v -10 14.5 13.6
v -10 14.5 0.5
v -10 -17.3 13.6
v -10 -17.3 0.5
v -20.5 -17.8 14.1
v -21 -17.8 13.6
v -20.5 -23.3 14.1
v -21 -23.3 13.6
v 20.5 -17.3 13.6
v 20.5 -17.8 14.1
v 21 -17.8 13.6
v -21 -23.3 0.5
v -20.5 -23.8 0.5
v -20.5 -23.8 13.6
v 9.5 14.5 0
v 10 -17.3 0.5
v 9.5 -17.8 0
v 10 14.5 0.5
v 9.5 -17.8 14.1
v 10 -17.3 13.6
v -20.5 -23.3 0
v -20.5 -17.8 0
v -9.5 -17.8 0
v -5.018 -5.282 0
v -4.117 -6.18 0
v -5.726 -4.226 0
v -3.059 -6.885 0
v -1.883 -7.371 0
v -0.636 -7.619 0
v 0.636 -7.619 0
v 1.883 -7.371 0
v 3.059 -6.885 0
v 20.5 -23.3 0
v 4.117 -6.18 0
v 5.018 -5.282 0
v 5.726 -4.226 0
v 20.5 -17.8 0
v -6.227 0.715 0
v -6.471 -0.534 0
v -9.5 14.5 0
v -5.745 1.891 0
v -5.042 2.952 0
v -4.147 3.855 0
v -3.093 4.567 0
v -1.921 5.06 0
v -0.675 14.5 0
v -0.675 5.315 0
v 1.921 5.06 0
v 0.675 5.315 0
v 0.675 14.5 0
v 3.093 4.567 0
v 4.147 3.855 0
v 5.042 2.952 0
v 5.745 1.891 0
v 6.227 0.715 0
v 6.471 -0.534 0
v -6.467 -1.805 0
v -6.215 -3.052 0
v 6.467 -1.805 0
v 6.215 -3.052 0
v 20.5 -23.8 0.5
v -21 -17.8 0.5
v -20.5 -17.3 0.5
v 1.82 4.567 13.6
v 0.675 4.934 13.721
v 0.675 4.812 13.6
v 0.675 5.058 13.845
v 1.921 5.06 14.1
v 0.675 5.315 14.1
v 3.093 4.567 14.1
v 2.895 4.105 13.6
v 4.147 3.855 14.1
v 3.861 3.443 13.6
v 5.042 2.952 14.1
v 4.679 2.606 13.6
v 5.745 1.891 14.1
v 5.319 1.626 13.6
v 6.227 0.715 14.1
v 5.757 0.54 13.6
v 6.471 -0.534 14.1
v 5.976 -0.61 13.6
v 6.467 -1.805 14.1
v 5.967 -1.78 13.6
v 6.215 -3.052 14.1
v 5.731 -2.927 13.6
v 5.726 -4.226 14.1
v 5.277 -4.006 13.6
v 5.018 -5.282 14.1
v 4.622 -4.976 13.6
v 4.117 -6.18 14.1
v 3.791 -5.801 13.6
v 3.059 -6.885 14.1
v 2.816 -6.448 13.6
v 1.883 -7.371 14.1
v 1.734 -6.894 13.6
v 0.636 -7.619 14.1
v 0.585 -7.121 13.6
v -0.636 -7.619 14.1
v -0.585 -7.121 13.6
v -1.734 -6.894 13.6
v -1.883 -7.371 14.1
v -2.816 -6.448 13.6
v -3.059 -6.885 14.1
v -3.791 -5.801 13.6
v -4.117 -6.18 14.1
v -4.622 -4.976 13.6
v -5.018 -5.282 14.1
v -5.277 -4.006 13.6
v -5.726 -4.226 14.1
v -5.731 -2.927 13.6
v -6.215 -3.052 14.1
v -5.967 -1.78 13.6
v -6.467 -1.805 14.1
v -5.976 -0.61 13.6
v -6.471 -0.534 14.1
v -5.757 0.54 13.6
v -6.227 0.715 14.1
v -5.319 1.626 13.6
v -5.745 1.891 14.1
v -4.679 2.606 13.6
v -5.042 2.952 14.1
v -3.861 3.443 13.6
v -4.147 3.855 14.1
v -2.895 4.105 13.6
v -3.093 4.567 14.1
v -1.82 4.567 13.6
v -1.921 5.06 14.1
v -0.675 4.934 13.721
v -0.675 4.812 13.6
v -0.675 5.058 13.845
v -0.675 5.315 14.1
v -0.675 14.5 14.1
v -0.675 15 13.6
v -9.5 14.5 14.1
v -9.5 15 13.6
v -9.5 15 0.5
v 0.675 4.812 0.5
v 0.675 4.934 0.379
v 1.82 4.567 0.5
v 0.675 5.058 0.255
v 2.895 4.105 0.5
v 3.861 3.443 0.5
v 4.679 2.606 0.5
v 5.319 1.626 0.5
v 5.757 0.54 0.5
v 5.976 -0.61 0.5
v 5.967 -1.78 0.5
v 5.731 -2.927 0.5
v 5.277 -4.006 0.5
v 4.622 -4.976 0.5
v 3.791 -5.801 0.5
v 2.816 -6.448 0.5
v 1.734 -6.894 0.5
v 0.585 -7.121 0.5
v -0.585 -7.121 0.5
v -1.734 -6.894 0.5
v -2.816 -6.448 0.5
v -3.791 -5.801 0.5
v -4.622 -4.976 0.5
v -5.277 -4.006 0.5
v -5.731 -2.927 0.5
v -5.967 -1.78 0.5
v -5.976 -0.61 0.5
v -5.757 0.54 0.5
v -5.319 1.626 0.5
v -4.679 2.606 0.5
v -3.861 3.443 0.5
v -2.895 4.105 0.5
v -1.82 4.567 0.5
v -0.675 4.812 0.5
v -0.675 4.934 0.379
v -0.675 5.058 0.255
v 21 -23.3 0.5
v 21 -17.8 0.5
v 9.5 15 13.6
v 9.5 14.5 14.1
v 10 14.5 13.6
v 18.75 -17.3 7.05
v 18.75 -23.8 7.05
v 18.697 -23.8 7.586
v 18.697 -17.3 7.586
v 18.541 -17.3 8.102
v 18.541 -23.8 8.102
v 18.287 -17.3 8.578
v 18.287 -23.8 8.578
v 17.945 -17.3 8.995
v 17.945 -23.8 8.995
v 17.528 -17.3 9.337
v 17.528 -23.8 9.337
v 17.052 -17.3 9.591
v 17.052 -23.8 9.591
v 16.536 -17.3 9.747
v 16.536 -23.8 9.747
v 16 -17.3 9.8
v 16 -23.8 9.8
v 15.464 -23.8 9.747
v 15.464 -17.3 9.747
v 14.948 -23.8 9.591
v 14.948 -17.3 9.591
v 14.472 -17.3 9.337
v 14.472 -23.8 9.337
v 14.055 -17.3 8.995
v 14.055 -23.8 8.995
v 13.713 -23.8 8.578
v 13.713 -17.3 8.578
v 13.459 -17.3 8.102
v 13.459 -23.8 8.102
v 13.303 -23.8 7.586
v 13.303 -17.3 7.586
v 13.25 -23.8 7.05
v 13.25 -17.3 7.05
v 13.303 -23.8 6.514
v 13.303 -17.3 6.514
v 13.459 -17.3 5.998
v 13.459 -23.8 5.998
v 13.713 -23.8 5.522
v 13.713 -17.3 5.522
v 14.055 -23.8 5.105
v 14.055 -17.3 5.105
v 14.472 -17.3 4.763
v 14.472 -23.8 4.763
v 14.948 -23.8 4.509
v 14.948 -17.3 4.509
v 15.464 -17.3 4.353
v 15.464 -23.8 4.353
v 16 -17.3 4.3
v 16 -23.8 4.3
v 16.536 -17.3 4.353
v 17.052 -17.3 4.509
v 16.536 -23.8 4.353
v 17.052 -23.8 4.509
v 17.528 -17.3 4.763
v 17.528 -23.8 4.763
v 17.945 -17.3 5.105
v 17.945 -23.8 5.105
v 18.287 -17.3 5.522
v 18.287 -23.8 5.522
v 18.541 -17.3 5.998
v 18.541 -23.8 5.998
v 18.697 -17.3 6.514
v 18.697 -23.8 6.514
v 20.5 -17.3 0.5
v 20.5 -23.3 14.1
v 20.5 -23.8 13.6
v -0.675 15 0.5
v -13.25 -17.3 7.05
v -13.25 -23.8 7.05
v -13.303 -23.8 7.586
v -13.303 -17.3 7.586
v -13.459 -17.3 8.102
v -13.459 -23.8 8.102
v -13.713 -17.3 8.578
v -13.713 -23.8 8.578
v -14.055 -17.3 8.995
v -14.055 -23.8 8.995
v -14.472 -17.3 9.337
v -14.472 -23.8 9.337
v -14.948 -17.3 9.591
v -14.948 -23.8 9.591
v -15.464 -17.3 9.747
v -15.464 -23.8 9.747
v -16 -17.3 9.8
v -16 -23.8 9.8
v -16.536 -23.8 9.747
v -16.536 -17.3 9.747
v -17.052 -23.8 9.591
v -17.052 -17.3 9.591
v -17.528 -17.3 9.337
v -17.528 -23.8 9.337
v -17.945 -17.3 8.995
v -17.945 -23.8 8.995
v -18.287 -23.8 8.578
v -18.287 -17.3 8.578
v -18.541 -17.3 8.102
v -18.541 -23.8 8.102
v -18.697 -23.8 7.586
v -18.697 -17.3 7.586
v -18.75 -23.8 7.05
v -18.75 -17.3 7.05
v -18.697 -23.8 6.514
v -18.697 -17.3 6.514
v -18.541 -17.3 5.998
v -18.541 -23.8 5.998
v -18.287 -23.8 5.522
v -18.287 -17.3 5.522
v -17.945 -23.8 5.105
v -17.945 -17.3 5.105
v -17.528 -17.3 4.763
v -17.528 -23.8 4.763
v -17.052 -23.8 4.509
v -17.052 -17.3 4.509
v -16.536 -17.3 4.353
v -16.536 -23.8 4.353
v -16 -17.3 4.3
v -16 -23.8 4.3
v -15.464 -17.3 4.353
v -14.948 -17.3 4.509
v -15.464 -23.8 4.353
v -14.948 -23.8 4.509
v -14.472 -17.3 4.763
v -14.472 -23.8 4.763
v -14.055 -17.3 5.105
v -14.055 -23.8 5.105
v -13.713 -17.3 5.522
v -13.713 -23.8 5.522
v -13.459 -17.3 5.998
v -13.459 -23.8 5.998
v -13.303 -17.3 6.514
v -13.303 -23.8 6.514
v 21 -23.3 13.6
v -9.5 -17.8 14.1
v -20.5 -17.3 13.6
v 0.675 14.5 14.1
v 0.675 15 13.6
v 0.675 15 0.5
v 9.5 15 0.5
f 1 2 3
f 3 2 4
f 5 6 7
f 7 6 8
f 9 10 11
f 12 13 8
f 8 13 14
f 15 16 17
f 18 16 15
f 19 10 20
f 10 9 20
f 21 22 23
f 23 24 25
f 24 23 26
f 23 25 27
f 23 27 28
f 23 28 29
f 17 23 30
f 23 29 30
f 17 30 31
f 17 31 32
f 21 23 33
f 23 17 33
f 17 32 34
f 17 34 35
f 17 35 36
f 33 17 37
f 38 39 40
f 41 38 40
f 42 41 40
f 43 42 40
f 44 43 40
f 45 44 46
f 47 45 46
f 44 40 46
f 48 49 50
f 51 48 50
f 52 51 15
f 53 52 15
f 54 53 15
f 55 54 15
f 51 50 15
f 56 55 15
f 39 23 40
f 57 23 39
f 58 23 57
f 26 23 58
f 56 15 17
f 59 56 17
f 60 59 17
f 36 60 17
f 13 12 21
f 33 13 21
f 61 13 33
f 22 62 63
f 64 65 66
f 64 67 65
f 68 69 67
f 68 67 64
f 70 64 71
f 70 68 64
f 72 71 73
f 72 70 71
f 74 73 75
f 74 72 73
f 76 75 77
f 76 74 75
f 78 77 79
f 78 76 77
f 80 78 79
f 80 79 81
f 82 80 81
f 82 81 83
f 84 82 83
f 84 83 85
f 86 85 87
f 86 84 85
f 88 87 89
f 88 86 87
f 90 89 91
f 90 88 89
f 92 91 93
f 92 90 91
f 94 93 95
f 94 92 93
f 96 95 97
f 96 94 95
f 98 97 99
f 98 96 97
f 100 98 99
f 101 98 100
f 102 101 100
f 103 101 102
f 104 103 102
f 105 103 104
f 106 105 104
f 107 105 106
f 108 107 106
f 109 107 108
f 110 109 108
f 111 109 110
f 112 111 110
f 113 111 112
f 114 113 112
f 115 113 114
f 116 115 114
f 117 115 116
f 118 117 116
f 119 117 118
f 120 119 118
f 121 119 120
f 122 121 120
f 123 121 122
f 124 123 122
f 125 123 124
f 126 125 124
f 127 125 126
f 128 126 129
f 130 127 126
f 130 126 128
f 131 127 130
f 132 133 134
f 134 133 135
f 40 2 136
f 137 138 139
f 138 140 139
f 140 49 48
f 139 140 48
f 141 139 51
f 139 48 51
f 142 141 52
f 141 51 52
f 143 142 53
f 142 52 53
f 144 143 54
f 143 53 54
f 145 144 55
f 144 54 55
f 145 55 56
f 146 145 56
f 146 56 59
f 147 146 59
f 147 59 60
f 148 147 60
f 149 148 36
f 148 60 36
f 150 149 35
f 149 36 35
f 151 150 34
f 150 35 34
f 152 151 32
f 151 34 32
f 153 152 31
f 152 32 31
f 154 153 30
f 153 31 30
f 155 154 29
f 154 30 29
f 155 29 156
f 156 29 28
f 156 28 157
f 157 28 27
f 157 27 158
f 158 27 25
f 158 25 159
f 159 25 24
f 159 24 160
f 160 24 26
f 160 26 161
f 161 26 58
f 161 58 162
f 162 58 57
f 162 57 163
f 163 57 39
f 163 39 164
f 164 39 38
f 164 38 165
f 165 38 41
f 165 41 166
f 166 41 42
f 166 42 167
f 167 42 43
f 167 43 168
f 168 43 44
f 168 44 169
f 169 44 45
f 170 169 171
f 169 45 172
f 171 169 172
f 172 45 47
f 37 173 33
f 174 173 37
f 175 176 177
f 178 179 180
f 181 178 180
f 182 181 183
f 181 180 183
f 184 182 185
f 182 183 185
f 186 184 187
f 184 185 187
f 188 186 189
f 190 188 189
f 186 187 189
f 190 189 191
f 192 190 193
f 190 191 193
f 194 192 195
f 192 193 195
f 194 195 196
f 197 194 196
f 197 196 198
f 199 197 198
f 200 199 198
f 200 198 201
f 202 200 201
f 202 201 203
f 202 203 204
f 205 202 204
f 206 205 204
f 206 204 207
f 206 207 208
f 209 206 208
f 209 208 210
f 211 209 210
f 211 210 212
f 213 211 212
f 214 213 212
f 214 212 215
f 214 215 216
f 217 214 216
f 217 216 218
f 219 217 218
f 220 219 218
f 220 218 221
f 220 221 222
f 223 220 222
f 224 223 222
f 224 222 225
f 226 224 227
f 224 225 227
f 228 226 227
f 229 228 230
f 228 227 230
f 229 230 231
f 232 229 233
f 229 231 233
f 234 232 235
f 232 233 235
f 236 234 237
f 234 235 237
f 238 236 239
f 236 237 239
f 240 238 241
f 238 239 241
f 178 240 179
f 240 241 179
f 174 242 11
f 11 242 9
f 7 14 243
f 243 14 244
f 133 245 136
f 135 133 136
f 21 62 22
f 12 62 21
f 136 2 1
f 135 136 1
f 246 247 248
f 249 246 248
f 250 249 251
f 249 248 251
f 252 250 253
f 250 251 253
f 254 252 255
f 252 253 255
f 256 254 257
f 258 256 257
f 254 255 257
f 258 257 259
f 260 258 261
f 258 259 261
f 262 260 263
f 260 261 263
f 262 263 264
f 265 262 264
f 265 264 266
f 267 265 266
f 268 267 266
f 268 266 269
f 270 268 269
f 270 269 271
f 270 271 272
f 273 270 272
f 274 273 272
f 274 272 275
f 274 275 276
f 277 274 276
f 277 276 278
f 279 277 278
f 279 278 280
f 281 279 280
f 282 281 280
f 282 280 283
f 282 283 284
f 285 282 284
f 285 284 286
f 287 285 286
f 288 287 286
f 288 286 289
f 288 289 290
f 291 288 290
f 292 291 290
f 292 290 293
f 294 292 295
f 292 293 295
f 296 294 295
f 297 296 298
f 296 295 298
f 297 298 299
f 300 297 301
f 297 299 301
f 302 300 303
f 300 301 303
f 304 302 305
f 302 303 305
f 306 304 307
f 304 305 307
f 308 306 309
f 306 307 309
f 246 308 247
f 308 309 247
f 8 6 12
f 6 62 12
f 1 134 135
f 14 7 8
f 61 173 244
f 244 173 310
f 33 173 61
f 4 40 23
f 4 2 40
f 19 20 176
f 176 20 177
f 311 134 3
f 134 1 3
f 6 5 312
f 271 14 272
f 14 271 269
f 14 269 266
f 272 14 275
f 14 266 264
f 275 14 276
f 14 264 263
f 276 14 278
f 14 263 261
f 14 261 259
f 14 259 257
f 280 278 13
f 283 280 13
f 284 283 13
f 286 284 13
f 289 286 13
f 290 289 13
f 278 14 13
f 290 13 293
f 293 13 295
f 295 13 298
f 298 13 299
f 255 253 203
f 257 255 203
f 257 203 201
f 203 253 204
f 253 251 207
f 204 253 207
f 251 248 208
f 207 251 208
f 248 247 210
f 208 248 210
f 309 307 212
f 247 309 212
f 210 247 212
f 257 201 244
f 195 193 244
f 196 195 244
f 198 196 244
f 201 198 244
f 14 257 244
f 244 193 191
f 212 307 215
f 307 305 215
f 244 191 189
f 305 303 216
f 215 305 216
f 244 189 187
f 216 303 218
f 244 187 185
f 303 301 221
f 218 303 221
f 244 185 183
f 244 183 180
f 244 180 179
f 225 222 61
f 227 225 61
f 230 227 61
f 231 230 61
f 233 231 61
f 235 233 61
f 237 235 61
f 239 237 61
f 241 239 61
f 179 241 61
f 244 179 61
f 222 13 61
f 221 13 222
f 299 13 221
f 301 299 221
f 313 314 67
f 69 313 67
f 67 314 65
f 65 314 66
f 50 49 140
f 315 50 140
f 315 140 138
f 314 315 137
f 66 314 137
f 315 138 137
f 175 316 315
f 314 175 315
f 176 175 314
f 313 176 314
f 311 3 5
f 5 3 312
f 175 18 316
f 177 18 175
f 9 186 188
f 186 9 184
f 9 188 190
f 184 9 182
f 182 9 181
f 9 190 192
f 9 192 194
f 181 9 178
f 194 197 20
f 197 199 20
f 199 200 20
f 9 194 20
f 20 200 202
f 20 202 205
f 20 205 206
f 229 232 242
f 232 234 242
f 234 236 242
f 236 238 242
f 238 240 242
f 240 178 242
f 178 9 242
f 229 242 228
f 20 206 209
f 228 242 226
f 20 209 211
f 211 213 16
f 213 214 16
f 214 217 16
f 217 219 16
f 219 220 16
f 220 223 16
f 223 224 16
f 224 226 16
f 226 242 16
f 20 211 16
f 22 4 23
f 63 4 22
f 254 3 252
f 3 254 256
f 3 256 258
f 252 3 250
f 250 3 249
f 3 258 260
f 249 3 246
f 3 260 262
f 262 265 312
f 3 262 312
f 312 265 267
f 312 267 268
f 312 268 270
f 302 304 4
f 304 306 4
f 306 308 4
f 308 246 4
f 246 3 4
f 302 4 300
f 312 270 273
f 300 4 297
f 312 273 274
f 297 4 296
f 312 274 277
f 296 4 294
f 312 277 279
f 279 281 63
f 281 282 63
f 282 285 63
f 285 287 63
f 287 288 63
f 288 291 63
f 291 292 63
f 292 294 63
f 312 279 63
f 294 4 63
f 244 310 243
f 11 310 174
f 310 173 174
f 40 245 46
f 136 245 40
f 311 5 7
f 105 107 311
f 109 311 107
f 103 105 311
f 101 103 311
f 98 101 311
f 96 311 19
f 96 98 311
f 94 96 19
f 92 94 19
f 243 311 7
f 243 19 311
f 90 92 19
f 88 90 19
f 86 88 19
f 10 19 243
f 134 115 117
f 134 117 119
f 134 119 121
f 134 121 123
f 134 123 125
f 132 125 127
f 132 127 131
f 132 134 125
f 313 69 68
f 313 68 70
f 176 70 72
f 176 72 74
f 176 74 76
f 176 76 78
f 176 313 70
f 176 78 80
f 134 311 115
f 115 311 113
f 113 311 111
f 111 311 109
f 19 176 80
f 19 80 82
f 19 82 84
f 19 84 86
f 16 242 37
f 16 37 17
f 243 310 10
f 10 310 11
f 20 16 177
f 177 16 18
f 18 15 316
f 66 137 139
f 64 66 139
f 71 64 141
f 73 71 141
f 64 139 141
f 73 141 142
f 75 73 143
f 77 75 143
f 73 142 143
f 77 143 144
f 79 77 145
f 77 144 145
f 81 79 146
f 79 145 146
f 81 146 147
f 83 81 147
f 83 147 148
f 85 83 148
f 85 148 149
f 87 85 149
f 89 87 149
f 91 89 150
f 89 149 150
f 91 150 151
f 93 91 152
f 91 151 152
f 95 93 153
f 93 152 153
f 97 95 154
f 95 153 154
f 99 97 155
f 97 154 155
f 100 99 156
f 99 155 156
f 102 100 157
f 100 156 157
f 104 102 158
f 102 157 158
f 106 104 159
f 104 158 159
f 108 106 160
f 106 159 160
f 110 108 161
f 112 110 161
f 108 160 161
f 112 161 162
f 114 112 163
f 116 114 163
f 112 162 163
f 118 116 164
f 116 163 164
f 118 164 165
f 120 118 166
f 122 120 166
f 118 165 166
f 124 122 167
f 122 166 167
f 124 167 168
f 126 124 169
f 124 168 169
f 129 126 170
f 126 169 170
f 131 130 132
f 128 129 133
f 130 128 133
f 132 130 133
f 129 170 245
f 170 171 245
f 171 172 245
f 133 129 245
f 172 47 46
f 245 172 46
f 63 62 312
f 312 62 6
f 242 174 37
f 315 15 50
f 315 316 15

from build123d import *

# Parameters (mm, degrees)
F1_DEPTH = 14.1
F2_R     = 2.75
F3_DEPTH = 38.801
F4_SIZE  = 0.5


with BuildPart() as f1:
    # F0 (on Top) → F1 (new body)
    with BuildSketch(Plane.XY):
        with BuildLine():
            ThreePointArc((0.675, 4.81191), (0, -7.15), (-0.675, 4.81191))
            Line((-0.675, 4.81191), (-0.675, 15))
            Line((-0.675, 15), (-10, 15))
            Line((-10, 15), (-10, -17.3))
            Line((-10, -17.3), (-21, -17.3))
            Line((-21, -17.3), (-21, -23.8))
            Line((-21, -23.8), (21, -23.8))
            Line((21, -23.8), (21, -17.3))
            Line((21, -17.3), (10, -17.3))
            Line((10, -17.3), (10, 15))
            Line((10, 15), (0.675, 15))
            Line((0.675, 15), (0.675, 4.81191))
        make_face()
    extrude(amount=F1_DEPTH)

    # F2 (on face) → F3 (cut, through all)
    with BuildSketch(Plane.XZ.offset(23.8)):
        with Locations((16, 7.05)):
            Circle(F2_R)
        with Locations((-16, 7.05)):
            Circle(F2_R)
    extrude(amount=-F3_DEPTH, mode=Mode.SUBTRACT)

    # F4
    f4_edges = [f1.edges().sort_by_distance(p)[0] for p in [
        (10, -1.15, 14.1),
        (15.5, -17.3, 14.1),
        (21, -20.55, 14.1),
        (21, -17.3, 7.05),
        (21, -23.8, 7.05),
        (21, -20.55, 0),
        (0, -23.8, 14.1),
        (-15.5, -17.3, 14.1),
        (-21, -20.55, 14.1),
        (-10, -1.15, 14.1),
        (-5.3375, 15, 14.1),
        (5.3375, 15, 14.1),
        (0, -7.15, 14.1),
        (-21, -17.3, 7.05),
        (-21, -23.8, 7.05),
        (-21, -20.55, 0),
        (-15.5, -17.3, 0),
        (-10, -1.15, 0),
        (0, -23.8, 0),
        (0, -7.15, 0),
        (-10, 15, 7.05),
        (-5.3375, 15, 0),
        (5.3375, 15, 0),
        (10, -1.15, 0),
        (15.5, -17.3, 0),
        (10, 15, 7.05),
    ]]
    chamfer(f4_edges, length=F4_SIZE)


solid = f1.part
